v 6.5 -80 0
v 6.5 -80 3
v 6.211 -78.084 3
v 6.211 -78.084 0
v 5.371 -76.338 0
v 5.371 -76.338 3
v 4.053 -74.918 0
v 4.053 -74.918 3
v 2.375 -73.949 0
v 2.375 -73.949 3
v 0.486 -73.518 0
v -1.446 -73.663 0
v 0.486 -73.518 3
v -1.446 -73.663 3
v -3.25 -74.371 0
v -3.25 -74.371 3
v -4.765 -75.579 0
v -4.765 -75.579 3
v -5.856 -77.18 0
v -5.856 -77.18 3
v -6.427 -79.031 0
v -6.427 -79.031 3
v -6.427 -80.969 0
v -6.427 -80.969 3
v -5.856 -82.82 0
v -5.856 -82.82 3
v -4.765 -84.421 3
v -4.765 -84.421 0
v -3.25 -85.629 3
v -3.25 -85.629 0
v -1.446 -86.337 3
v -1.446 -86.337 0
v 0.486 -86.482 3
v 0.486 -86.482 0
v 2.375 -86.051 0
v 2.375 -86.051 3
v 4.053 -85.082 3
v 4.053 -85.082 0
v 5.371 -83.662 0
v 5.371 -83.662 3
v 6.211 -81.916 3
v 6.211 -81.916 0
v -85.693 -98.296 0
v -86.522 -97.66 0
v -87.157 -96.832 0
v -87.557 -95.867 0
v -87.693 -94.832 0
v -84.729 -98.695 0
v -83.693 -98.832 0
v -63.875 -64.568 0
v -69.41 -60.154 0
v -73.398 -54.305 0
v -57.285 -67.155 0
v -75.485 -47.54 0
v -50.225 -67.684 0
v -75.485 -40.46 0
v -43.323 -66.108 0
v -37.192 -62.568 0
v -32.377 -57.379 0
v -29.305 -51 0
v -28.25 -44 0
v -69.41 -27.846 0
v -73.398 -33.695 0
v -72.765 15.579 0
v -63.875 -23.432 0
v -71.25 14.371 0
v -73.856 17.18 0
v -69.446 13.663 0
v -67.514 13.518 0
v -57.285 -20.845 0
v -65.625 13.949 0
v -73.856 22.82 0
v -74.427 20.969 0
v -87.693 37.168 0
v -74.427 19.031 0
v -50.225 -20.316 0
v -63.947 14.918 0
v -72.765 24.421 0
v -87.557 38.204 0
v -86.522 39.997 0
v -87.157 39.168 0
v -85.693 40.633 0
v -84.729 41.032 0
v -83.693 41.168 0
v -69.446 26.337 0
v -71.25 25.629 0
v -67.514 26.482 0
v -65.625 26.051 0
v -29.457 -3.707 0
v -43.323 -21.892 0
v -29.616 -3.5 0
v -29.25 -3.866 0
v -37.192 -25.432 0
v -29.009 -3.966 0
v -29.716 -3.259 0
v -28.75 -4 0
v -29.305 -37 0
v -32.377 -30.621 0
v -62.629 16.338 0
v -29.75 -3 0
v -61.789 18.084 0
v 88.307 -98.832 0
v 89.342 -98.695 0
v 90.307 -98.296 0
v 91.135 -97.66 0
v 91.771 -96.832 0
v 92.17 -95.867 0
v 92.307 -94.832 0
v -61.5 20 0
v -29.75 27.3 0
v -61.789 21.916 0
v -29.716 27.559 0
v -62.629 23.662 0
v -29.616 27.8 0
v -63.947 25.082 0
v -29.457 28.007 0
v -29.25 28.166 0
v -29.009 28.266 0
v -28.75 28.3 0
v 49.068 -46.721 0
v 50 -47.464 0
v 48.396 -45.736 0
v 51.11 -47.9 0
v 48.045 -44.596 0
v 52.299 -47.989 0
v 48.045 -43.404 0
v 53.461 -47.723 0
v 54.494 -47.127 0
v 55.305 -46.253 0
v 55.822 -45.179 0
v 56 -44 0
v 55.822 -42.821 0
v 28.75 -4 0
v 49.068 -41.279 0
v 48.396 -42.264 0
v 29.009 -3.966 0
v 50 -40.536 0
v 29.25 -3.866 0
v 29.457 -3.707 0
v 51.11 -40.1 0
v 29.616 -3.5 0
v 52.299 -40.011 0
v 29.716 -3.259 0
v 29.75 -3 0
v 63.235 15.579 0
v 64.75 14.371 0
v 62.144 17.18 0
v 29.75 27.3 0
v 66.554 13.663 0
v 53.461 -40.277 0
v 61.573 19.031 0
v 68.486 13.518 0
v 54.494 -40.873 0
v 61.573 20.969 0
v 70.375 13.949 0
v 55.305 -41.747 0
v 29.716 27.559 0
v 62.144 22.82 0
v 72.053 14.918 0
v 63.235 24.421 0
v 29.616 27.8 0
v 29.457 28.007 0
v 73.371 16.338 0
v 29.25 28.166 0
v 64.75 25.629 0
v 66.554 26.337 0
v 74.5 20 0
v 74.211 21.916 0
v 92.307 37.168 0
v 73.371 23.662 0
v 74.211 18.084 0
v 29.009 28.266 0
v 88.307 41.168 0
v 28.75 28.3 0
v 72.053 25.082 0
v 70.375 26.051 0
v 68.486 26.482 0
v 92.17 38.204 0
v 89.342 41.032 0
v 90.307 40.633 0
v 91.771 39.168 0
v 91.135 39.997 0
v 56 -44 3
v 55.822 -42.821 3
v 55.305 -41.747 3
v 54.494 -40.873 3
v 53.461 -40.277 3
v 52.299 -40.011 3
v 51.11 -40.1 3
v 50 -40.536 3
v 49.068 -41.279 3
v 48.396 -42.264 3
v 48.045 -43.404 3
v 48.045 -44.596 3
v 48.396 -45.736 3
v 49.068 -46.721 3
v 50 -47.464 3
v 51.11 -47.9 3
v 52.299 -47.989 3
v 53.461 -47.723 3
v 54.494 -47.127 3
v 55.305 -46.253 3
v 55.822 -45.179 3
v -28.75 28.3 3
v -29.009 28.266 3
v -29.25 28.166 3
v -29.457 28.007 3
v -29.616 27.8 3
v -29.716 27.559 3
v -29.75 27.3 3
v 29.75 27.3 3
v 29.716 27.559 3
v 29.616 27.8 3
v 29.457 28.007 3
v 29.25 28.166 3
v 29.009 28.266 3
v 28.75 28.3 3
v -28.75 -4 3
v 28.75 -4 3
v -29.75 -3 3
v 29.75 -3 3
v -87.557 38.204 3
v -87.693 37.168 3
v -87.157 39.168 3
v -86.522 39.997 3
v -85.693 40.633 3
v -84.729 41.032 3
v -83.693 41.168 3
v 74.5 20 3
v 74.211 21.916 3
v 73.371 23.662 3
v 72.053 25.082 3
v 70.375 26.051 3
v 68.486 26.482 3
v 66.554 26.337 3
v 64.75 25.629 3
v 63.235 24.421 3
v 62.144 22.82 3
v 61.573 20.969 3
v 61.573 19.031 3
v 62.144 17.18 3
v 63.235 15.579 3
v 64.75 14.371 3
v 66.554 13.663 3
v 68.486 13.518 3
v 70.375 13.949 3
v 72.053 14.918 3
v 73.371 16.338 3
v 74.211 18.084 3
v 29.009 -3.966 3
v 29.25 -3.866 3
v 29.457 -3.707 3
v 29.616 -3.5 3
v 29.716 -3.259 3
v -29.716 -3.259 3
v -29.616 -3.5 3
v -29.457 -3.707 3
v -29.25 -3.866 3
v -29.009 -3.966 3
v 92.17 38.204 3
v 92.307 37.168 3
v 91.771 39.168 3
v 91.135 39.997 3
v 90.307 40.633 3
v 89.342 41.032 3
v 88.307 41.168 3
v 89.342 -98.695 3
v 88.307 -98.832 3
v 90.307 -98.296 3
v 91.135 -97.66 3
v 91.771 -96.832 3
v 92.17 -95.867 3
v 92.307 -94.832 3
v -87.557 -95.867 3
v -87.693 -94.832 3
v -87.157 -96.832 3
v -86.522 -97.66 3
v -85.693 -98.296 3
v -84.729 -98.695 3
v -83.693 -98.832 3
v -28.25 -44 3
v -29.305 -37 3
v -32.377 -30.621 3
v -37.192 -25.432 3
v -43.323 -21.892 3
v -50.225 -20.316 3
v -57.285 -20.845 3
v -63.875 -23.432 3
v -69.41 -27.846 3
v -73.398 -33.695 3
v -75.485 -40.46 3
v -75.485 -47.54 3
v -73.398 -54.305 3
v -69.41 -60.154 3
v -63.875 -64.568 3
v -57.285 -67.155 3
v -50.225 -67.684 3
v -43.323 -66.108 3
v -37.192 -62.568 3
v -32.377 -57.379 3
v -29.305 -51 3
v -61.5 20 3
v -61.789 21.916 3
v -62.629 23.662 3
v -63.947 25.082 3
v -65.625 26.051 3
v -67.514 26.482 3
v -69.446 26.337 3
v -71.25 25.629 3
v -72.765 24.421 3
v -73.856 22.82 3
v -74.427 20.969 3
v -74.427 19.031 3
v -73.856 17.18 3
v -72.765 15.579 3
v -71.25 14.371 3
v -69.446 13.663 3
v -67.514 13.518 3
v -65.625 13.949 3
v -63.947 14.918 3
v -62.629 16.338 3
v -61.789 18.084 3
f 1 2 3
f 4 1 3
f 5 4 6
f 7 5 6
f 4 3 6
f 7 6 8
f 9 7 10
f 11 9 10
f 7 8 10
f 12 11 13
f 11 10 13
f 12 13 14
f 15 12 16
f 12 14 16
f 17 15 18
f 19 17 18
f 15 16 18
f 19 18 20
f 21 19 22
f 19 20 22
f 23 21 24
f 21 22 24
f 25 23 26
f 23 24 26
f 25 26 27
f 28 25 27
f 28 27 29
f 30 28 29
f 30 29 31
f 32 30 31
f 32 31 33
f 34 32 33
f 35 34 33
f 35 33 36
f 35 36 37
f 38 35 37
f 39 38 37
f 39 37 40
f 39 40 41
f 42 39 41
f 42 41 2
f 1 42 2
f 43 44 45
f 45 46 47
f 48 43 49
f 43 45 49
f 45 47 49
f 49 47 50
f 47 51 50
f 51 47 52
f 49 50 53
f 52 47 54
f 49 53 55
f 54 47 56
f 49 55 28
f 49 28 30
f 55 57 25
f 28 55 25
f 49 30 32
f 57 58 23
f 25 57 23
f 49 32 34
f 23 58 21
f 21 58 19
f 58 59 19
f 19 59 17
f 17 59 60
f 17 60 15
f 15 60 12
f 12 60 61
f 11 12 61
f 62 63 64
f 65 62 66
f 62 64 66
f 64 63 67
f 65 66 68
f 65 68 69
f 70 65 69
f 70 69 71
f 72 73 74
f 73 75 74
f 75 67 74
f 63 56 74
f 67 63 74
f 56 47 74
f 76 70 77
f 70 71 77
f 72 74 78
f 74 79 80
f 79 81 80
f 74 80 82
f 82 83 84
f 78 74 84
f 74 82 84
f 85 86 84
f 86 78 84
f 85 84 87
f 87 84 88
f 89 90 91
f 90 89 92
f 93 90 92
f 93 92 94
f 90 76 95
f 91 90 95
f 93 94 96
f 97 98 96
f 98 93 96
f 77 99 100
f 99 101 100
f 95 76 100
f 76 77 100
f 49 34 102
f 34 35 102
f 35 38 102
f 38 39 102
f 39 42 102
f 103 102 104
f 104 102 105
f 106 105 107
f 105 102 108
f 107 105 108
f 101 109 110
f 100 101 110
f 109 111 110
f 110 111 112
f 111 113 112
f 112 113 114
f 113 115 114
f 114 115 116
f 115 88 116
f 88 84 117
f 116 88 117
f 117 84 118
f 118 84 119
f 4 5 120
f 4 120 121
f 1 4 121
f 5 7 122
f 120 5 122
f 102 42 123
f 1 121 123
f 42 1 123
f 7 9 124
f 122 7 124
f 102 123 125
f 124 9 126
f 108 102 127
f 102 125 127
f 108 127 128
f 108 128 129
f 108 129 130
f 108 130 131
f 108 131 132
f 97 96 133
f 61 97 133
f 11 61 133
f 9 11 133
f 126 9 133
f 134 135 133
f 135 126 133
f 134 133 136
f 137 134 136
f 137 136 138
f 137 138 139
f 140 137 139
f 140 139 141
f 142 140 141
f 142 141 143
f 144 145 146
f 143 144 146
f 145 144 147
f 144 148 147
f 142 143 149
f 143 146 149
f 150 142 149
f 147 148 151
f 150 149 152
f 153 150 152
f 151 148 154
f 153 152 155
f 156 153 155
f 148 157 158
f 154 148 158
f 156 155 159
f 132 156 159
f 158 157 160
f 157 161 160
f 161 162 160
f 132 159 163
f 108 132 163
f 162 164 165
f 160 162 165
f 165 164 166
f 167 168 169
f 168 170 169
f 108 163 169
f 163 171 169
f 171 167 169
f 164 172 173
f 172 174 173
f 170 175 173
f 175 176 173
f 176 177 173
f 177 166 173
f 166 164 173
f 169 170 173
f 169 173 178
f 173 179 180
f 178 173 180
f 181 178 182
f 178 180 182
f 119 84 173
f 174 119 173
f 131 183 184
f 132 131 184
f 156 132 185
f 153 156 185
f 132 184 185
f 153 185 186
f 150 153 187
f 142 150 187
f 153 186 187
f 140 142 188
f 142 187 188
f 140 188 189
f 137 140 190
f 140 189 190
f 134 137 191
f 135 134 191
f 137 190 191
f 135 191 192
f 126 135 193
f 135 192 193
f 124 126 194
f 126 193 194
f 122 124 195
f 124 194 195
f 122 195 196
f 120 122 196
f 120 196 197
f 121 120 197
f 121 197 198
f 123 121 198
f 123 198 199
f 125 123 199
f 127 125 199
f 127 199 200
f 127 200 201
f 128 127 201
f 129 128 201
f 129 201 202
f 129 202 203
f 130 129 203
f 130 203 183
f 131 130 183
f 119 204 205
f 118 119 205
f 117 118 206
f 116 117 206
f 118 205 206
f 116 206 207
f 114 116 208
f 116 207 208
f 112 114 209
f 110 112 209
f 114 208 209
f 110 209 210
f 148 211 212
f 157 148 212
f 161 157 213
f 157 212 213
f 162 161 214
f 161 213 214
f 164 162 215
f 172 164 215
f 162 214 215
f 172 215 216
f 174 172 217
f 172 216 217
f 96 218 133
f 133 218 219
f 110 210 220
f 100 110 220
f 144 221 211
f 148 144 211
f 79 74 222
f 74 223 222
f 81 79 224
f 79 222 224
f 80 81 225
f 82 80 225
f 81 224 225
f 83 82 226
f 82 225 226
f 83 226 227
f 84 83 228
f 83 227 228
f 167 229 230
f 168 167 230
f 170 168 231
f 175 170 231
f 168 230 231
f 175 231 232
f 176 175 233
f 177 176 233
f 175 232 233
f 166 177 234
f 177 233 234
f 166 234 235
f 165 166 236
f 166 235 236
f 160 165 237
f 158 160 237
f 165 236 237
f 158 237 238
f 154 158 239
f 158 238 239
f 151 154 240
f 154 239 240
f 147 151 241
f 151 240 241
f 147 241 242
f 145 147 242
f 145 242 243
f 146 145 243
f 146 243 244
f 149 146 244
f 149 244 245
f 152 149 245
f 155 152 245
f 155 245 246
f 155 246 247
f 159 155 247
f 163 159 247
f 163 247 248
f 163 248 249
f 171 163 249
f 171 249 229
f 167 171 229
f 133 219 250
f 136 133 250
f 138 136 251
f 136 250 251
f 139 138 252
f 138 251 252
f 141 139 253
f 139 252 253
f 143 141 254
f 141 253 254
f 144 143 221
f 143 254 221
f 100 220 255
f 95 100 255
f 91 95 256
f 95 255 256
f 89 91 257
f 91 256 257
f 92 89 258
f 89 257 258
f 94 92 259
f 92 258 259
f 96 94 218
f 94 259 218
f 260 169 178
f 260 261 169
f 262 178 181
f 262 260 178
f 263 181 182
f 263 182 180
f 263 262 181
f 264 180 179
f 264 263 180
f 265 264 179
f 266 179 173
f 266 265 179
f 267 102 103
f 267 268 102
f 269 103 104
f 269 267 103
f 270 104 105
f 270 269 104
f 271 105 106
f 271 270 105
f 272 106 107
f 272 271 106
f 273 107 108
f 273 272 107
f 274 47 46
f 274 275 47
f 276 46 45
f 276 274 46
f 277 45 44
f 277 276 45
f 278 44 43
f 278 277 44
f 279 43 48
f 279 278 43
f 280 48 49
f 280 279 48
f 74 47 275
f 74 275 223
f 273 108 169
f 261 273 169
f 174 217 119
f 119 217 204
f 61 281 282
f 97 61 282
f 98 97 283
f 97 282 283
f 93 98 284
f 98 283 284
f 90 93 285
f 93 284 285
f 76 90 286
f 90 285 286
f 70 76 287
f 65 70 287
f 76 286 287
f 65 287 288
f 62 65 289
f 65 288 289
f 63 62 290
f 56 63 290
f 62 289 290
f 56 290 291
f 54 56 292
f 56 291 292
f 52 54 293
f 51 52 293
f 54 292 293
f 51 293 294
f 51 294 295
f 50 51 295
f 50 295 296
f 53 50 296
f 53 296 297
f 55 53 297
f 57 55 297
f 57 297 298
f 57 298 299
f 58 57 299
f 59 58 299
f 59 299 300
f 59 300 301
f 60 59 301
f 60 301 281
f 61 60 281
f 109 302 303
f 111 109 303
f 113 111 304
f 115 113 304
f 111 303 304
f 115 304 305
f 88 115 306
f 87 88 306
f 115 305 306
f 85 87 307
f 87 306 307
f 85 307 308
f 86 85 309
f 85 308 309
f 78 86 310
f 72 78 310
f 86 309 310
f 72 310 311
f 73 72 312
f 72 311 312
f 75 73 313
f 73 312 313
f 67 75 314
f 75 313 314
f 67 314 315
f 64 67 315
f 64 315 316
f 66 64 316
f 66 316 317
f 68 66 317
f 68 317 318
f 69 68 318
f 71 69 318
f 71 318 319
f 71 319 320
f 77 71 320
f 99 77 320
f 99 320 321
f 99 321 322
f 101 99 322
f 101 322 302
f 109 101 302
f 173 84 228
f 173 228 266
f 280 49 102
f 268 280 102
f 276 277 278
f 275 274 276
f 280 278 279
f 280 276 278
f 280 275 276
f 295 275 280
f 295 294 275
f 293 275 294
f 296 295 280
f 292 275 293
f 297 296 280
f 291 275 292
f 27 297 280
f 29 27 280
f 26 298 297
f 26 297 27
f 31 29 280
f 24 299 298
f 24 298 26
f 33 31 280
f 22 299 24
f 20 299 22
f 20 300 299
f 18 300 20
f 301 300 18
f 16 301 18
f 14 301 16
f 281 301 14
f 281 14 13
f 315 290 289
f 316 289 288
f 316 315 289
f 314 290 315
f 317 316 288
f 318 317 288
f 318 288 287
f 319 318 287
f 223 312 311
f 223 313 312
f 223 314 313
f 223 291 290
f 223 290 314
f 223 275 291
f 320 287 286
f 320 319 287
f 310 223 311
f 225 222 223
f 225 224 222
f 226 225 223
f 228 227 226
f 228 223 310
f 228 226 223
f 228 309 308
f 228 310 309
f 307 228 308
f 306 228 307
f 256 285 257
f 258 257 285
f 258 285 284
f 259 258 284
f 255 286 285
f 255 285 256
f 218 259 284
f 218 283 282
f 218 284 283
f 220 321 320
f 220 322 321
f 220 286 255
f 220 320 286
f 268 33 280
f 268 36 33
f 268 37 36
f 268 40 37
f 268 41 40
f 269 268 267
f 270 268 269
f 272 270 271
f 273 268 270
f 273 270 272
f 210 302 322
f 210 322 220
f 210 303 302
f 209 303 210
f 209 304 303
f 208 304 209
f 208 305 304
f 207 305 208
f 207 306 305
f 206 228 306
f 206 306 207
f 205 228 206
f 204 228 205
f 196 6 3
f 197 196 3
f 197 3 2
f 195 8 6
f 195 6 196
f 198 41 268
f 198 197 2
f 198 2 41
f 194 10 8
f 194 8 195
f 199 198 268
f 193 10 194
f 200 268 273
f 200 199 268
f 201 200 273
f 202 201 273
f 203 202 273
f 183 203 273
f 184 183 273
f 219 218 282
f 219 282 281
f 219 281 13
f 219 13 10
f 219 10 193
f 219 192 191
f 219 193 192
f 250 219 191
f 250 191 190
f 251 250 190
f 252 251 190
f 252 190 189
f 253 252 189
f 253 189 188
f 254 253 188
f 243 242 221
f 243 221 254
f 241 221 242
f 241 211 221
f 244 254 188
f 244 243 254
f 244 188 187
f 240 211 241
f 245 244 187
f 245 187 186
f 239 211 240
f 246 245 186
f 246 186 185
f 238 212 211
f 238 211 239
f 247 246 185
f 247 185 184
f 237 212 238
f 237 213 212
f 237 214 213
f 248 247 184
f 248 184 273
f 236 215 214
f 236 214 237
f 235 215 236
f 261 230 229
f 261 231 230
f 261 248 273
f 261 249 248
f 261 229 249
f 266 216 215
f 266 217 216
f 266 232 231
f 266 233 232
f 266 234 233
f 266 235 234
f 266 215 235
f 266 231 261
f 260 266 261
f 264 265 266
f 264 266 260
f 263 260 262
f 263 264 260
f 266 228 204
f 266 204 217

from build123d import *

# Parameters (mm, degrees)
SKETCH030_W     = 180
SKETCH030_H     = 140
PAD008_DEPTH    = 3
FILLET002_R     = 4
SKETCH031_R     = 6.5
SKETCH031_R_2   = 23.75
SKETCH031_R_3   = 4
POCKET006_DEPTH = 3.001


with BuildPart() as part:
    # Sketch030 (on XY_Plane010 of Origin021) → Pad008 (new body)
    with BuildSketch(Plane.XY):
        with Locations((2.306624, -28.831528)):
            Rectangle(SKETCH030_W, SKETCH030_H)
    extrude(amount=PAD008_DEPTH)

    # Fillet002
    fillet002_edges = [part.edges().sort_by_distance(p)[0] for p in [
        (-87.693376, 41.168472, 1.5),
        (92.306624, 41.168472, 1.5),
        (92.306624, -98.831528, 1.5),
        (-87.693376, -98.831528, 1.5),
    ]]
    fillet(fillet002_edges, radius=FILLET002_R)

    # Sketch031 (on Face5 of Fillet002) → Pocket006 (cut, through all)
    with BuildSketch(Plane.XY.offset(3)):
        with Locations((-68, 20)):
            Circle(SKETCH031_R)
        with Locations((-52, -44)):
            Circle(SKETCH031_R_2)
        with Locations((52, -44)):
            Circle(SKETCH031_R_3)
        with Locations((0, -80)):
            Circle(SKETCH031_R)
        with Locations((68, 20)):
            Circle(SKETCH031_R)
        with BuildLine():
            Line((-28.75, -4), (28.75, -4))
            ThreePointArc((28.75, -4), (29.457107, -3.707107), (29.75, -3))
            Line((29.75, -3), (29.75, 27.3))
            ThreePointArc((29.75, 27.3), (29.457107, 28.007107), (28.75, 28.3))
            Line((28.75, 28.3), (-28.75, 28.3))
            ThreePointArc((-28.75, 28.3), (-29.457107, 28.007107), (-29.75, 27.3))
            Line((-29.75, 27.3), (-29.75, -3))
            ThreePointArc((-29.75, -3), (-29.457107, -3.707107), (-28.75, -4))
        make_face()
    extrude(amount=-POCKET006_DEPTH, mode=Mode.SUBTRACT)


solid = part.part
